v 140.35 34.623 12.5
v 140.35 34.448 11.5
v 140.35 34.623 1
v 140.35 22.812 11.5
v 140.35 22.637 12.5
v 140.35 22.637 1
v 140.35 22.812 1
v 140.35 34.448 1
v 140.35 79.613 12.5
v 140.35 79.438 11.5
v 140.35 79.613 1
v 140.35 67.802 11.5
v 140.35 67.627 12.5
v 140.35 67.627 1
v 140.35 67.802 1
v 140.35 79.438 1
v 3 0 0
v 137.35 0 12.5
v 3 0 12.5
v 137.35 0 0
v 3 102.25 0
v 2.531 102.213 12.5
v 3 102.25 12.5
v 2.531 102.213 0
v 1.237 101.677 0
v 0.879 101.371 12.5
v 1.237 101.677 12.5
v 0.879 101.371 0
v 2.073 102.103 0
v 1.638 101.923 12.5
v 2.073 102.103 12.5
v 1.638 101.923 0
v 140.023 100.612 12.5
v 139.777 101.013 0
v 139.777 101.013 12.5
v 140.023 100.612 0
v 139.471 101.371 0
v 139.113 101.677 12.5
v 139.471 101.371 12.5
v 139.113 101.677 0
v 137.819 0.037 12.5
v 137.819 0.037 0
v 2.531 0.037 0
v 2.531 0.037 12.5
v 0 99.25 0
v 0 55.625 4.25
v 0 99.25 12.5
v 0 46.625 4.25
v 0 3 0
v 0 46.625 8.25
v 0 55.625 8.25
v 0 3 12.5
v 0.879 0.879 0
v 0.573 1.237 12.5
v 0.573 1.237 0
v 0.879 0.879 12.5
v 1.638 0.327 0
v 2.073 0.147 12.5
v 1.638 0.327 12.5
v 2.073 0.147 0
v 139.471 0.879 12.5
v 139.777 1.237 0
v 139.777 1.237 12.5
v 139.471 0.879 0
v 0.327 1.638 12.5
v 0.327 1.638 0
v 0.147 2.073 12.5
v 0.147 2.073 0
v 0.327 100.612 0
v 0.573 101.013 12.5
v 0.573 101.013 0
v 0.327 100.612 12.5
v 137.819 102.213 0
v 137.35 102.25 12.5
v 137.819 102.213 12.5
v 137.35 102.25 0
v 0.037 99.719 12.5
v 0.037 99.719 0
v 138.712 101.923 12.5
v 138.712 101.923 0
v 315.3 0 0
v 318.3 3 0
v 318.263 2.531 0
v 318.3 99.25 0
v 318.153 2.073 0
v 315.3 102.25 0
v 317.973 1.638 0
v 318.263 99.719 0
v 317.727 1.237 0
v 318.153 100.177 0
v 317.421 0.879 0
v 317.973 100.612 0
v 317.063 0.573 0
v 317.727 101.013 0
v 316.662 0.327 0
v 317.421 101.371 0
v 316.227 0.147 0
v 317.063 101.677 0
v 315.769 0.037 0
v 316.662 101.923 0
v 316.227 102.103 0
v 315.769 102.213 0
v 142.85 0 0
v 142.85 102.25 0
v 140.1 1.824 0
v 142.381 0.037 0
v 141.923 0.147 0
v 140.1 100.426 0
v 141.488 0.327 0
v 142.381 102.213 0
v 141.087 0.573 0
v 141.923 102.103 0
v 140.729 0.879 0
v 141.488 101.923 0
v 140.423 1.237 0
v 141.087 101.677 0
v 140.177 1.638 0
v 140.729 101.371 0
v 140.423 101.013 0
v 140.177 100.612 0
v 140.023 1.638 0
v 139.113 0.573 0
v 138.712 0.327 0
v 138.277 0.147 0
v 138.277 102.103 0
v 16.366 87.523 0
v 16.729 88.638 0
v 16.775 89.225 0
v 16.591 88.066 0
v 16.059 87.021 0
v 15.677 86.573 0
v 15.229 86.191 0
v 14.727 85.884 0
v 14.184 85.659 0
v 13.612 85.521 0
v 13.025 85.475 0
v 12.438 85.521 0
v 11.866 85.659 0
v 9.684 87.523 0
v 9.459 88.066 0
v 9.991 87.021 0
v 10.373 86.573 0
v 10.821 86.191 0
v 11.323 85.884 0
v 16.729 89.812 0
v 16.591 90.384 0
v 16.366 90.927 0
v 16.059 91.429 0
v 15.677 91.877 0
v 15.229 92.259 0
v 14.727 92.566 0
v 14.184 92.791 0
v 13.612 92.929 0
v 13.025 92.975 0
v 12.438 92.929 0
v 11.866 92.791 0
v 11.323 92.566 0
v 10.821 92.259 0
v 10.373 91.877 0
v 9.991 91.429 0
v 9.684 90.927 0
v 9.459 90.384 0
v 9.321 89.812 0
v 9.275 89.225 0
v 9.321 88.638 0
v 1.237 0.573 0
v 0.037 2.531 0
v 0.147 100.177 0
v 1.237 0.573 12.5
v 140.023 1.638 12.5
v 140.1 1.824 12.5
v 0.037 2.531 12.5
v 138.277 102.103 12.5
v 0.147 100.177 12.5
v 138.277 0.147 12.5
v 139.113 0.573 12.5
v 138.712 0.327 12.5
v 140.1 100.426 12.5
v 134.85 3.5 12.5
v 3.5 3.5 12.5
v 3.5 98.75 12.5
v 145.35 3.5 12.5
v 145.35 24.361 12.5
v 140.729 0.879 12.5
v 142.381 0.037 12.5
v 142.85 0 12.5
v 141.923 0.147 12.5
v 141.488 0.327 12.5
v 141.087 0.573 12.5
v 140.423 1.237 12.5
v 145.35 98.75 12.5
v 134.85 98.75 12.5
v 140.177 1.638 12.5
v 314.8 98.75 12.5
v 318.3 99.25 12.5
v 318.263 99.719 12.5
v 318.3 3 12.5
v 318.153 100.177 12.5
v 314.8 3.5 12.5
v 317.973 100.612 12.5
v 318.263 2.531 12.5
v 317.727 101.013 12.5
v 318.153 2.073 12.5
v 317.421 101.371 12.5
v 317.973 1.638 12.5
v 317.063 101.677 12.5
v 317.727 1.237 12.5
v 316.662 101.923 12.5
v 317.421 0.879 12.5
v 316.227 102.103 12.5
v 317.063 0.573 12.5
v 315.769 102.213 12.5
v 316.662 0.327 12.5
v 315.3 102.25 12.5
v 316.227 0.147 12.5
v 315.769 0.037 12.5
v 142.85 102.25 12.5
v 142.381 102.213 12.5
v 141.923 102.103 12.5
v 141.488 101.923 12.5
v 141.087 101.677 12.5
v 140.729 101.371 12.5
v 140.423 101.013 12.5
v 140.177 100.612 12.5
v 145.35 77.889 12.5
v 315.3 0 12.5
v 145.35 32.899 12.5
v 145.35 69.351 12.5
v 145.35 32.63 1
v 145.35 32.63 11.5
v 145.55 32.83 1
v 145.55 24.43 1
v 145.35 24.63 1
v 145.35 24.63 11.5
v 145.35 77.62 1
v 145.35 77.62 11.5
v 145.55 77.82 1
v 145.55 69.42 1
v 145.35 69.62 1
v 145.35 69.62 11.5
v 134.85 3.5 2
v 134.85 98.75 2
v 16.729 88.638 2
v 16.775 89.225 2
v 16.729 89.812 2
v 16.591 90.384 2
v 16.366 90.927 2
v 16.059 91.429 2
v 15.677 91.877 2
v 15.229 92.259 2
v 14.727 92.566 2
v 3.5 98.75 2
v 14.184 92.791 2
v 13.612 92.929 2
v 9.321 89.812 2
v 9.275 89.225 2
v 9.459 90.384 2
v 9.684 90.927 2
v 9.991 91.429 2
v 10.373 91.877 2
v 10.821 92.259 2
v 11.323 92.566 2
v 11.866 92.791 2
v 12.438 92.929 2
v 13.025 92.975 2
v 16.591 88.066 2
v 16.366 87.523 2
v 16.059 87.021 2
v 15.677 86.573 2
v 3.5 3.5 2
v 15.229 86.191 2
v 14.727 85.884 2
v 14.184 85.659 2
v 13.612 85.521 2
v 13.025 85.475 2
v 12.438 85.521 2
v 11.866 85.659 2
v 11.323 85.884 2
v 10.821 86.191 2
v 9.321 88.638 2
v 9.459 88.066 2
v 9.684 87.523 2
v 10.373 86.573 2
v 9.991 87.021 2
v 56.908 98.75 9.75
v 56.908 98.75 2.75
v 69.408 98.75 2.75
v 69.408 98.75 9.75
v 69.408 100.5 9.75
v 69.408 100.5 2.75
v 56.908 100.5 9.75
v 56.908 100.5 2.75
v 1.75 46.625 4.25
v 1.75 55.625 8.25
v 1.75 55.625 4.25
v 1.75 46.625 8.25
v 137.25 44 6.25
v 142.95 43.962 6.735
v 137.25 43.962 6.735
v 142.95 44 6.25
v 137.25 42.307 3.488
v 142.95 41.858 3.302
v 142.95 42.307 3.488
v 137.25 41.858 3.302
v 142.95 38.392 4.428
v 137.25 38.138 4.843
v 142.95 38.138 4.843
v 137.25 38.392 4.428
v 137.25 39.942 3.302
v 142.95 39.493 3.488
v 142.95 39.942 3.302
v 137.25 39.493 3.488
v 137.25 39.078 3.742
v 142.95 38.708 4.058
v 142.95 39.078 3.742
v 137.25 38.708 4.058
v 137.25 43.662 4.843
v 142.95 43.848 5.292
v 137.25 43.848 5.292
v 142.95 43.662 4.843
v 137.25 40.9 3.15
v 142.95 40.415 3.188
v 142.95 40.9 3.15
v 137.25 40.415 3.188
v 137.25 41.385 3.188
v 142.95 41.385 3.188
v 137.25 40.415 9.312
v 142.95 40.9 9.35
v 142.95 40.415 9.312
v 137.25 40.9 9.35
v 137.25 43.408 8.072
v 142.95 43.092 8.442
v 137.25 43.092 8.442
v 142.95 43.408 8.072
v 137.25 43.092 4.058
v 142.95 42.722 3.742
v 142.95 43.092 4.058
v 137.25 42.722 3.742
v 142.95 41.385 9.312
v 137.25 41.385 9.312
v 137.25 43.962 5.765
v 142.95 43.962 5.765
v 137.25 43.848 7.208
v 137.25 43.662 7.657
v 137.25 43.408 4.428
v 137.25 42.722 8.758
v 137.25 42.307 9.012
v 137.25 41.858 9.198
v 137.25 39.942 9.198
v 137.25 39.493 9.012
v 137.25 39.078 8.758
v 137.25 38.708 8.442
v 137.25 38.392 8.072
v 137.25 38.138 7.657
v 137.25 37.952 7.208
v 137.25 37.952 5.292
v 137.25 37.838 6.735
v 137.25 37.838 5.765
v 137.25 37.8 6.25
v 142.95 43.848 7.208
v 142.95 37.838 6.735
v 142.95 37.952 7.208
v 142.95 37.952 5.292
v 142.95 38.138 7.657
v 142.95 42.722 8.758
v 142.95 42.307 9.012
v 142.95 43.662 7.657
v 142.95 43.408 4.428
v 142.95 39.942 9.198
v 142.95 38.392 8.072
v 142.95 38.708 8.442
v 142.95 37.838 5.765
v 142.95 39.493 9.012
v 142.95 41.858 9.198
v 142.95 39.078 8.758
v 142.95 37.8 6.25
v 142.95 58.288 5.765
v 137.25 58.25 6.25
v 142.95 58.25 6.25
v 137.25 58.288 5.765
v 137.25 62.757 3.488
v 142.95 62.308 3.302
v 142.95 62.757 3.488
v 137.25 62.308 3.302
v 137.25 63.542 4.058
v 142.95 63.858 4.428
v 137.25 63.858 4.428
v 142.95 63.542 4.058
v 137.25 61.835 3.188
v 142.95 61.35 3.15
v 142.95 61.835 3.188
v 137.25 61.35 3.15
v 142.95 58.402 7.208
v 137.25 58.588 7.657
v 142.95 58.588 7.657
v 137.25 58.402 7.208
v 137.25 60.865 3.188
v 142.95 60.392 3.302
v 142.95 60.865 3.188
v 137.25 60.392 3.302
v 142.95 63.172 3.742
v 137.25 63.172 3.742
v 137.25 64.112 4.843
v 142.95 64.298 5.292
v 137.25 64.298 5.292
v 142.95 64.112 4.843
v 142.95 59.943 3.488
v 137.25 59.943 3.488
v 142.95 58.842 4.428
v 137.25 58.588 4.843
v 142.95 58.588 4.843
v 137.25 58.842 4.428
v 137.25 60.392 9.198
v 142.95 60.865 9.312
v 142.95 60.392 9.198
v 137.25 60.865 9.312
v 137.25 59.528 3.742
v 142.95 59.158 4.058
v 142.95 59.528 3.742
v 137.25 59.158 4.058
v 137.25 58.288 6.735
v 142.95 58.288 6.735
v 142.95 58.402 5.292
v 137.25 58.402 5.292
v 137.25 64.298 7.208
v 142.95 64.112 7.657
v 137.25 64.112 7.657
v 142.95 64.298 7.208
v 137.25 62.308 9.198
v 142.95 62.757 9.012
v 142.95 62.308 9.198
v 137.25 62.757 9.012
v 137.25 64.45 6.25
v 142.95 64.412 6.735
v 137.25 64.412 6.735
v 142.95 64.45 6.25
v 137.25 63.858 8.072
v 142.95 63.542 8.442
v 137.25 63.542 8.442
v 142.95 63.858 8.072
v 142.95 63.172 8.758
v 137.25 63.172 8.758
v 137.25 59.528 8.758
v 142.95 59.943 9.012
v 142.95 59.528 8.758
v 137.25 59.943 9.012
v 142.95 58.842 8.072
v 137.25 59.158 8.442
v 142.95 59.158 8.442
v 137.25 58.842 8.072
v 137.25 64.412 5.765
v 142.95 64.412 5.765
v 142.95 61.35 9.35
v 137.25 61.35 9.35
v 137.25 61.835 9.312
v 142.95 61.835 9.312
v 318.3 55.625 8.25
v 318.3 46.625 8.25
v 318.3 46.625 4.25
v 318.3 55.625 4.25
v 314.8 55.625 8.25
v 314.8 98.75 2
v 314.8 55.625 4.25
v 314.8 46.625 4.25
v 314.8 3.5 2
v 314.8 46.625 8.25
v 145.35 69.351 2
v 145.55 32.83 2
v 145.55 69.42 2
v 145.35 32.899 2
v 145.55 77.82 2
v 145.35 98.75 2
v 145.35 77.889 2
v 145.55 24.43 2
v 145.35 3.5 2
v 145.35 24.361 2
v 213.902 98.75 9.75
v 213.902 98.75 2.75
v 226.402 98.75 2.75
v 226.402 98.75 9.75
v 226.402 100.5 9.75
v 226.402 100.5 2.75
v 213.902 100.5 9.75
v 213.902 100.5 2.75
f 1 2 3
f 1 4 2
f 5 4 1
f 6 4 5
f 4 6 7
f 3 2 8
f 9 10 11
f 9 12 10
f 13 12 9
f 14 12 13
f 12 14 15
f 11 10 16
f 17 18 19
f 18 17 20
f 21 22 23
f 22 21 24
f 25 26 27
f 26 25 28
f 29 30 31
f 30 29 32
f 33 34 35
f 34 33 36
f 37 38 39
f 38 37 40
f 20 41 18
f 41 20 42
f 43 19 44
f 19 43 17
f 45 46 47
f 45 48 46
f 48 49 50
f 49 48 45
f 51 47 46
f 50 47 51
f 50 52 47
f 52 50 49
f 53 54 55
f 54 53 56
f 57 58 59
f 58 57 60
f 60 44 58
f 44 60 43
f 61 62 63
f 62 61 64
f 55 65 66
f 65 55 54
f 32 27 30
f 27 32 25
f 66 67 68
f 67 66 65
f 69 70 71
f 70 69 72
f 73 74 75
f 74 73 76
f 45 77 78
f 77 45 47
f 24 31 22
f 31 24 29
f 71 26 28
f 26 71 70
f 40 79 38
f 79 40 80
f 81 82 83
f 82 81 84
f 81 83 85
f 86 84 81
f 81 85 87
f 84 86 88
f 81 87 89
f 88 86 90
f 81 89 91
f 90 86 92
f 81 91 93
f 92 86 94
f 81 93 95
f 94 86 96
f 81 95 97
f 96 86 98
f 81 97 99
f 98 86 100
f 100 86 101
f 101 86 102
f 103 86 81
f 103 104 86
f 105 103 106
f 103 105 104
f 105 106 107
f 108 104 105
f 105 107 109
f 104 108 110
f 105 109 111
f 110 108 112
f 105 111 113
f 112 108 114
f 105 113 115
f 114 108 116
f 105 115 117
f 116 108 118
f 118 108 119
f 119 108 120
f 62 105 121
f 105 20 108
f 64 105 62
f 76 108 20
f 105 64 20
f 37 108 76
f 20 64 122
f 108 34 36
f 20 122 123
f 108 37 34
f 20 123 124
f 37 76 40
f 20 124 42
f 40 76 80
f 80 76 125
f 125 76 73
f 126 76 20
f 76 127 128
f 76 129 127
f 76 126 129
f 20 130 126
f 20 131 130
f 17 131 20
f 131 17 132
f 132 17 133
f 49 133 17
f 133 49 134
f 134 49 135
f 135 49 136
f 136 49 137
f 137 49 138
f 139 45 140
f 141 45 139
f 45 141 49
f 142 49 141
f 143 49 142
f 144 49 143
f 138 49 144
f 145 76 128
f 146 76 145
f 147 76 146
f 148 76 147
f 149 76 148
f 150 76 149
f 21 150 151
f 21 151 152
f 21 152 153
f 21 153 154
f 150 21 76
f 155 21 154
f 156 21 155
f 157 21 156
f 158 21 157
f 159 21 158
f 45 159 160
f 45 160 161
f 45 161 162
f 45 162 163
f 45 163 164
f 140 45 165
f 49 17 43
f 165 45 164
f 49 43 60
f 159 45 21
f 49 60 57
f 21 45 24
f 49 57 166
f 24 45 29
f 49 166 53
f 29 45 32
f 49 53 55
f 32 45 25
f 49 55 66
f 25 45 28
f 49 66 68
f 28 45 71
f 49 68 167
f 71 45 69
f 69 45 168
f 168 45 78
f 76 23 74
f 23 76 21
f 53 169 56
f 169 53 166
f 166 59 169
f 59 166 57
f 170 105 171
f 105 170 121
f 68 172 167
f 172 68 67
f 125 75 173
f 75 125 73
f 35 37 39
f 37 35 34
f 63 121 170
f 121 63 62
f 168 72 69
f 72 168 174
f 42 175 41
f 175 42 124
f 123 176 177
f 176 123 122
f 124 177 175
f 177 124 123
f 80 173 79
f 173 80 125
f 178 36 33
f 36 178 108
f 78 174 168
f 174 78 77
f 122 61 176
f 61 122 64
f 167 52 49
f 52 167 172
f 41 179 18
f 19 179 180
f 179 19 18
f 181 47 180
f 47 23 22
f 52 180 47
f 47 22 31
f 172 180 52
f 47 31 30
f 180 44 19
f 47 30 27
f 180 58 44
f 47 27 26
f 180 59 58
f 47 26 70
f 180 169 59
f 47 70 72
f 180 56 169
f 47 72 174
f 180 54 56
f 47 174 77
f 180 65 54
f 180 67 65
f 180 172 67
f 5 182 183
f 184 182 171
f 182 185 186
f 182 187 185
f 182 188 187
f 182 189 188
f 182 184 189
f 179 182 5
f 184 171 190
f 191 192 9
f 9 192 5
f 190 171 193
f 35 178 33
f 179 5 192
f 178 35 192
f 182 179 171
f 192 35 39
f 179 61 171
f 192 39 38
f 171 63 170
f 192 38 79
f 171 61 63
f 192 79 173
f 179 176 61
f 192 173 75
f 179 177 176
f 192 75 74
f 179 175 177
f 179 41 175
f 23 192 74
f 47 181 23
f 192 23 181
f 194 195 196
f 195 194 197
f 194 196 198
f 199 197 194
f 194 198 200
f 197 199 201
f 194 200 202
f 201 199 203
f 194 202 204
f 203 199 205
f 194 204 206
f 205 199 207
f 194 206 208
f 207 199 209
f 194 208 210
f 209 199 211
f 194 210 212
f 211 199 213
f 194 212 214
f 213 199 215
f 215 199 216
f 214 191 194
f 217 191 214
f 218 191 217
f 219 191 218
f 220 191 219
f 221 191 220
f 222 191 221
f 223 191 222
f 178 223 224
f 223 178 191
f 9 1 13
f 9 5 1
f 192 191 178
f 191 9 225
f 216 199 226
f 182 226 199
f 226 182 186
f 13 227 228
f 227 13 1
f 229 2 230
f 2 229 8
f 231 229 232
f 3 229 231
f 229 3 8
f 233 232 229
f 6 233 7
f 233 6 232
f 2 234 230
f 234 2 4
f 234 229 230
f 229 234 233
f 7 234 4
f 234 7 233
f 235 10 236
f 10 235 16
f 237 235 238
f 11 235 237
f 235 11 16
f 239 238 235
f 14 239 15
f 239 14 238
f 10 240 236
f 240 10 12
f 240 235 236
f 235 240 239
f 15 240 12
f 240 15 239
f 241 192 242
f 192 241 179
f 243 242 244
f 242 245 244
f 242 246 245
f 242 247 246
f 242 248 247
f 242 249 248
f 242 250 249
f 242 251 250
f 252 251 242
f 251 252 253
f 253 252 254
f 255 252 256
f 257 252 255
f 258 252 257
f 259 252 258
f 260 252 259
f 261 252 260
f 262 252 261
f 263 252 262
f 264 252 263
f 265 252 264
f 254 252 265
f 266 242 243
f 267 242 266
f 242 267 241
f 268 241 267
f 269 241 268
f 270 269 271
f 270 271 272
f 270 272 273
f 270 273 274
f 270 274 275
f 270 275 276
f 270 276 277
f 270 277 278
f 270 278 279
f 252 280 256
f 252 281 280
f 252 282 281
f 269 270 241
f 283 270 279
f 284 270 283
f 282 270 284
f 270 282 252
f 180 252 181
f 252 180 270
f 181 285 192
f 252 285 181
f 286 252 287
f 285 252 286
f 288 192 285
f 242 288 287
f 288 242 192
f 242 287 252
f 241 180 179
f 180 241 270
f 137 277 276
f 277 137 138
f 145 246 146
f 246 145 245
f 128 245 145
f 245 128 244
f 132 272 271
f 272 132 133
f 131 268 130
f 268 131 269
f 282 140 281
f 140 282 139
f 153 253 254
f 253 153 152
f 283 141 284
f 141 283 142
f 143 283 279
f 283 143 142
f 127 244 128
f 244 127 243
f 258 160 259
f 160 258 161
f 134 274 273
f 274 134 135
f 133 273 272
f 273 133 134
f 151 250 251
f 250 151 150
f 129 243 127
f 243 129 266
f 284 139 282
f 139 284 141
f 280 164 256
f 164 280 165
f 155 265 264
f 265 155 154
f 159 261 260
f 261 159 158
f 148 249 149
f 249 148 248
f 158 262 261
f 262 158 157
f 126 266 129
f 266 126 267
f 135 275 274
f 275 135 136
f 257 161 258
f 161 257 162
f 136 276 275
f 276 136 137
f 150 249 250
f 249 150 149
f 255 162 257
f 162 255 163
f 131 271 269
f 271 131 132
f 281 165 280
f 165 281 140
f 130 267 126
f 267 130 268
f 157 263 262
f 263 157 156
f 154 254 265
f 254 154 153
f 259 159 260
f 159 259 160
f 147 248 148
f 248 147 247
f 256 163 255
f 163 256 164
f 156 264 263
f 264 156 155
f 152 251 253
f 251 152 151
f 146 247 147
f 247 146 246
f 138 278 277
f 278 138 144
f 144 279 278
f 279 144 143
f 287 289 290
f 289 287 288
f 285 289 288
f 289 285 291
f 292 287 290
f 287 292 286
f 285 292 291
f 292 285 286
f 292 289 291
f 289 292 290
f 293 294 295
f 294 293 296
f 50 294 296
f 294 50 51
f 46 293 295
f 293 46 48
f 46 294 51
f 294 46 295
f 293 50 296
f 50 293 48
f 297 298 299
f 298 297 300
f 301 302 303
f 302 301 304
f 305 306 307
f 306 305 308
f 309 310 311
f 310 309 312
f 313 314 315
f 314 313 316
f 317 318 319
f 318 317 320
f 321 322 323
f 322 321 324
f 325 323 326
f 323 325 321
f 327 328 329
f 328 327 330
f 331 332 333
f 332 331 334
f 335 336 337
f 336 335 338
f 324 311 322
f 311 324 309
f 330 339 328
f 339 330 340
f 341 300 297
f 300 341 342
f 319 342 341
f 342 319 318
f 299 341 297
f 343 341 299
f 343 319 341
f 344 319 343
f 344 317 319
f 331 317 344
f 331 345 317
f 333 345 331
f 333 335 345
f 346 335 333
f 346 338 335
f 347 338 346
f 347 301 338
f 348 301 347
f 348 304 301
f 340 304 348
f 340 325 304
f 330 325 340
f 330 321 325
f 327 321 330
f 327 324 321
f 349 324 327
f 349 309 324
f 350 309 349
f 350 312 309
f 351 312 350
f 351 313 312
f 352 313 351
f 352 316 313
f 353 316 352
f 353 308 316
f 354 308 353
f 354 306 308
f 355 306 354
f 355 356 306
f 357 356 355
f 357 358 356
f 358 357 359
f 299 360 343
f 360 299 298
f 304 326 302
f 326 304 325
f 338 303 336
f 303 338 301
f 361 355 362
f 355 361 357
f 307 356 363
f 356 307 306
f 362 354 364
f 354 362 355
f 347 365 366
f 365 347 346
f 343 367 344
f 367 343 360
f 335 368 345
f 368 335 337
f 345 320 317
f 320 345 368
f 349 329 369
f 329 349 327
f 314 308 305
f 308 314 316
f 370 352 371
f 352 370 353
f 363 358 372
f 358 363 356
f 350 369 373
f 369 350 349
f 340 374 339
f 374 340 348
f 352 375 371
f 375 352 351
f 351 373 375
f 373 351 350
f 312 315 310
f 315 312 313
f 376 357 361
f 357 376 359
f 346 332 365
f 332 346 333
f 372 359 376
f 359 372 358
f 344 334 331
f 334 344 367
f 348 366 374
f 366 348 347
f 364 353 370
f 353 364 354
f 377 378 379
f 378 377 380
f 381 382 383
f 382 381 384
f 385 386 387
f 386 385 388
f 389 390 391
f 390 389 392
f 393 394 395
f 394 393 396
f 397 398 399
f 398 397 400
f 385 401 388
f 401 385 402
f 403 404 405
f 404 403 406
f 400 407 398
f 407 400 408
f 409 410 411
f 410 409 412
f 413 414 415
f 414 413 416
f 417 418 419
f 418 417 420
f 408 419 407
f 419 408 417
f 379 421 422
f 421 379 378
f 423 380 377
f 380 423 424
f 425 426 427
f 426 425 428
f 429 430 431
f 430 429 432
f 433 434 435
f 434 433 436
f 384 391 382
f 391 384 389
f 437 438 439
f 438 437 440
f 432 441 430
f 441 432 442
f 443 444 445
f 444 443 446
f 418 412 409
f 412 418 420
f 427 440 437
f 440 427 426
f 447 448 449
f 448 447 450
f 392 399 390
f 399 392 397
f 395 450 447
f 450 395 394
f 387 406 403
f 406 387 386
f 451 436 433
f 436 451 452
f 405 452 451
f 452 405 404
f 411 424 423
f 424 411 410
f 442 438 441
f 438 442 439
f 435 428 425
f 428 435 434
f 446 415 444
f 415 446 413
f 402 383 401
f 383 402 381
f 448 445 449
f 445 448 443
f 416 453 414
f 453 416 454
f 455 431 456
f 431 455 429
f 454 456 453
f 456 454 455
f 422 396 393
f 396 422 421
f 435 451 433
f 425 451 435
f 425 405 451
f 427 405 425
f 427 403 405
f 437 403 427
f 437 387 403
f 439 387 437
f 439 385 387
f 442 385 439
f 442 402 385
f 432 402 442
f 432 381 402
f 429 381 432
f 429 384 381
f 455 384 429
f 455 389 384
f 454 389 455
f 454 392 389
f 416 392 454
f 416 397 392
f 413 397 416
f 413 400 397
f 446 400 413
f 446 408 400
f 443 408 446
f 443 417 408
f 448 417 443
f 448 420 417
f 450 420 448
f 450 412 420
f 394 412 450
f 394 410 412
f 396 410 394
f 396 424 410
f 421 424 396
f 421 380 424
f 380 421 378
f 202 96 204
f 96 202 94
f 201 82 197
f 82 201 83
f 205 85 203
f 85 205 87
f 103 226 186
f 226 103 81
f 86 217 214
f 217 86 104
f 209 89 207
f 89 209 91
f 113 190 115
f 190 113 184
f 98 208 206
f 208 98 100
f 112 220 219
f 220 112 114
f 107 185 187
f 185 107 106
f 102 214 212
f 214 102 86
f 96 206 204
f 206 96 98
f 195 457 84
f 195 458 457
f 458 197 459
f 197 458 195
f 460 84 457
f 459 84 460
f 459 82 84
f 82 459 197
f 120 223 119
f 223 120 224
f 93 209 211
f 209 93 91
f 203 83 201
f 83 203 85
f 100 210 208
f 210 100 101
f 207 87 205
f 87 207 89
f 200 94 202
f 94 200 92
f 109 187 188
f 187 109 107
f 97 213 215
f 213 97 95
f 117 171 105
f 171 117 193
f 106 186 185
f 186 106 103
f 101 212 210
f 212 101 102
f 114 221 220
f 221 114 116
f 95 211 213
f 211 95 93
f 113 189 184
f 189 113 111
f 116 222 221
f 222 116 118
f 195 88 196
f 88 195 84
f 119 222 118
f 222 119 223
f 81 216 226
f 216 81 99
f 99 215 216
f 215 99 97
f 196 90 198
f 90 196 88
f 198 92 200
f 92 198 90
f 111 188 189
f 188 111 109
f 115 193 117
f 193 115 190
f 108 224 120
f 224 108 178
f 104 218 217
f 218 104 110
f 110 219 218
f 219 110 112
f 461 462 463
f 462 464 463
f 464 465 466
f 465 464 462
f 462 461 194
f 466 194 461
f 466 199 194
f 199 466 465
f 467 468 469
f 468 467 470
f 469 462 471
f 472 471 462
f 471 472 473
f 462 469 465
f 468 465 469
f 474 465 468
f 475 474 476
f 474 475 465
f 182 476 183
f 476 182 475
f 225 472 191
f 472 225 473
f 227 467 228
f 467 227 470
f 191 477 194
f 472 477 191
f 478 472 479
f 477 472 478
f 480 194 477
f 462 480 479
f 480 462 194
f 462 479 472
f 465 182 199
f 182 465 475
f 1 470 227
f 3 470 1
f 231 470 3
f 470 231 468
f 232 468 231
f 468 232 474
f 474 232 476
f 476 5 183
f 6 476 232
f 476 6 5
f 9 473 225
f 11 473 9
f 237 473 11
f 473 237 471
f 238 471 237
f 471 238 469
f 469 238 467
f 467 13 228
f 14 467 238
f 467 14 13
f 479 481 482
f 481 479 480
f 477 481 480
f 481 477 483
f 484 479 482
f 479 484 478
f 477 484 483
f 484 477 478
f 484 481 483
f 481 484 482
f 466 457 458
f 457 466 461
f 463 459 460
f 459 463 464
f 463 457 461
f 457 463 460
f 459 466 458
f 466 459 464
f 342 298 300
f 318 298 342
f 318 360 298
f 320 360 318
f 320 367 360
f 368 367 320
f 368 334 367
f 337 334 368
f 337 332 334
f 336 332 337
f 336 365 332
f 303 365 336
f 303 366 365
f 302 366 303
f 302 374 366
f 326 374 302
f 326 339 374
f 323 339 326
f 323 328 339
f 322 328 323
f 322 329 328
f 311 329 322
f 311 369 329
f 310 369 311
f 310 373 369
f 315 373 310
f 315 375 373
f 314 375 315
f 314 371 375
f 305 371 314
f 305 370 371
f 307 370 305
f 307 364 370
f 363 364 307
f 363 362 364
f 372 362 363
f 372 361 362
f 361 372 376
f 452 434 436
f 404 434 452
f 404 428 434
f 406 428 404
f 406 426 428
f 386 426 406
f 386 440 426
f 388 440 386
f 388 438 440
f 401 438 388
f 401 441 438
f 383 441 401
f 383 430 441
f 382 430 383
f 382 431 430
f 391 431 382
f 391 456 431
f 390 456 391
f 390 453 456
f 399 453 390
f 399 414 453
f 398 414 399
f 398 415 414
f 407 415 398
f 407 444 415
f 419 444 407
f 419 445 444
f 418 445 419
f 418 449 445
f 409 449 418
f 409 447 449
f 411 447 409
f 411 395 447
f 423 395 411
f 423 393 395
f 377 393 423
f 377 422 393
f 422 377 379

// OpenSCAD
// file: interlock_params.scad
/*
 * Interlock Ergo - Shared Parametric Definitions
 * Supports both Kailh Choc v1 (crkbd/corne style) and Cherry MX standards.
 */

// Global OpenSCAD rendering resolution
$fn = 40;

// Interlocking mechanical tolerances
interlock_tol = 0.20;     // 0.2mm sliding joint clearance
magnet_d = 6.2;           // Pocket for 6mm disc magnet
magnet_h = 3.2;           // Pocket depth for 3mm magnet
fillet_r = 3.0;           // Outer chassis corner radius
wall_thickness = 3.5;     // Exterior perimeter wall

// Switch Standards
// Choc v1 (Corne/crkbd standard): 18.0mm X pitch, 17.0mm Y pitch, 1.2mm plate thickness
choc_pitch_x = 18.0;
choc_pitch_y = 17.0;
choc_switch_cutout = 13.8;
choc_plate_thickness = 1.2;
choc_case_depth = 9.5;    // Low profile depth

// MX Standard: 19.05mm X pitch, 19.05mm Y pitch, 1.5mm plate thickness
mx_pitch_x = 19.05;
mx_pitch_y = 19.05;
mx_switch_cutout = 14.0;
mx_plate_thickness = 1.5;
mx_case_depth = 12.5;     // Standard MX depth

// Common utility: Rounded box
module rounded_box(w, l, h, r) {
    hull() {
        translate([r, r, 0]) cylinder(r = r, h = h);
        translate([w - r, r, 0]) cylinder(r = r, h = h);
        translate([w - r, l - r, 0]) cylinder(r = r, h = h);
        translate([r, l - r, 0]) cylinder(r = r, h = h);
    }
}

// Interlocking male dovetail tab
module dovetail_male(depth) {
    linear_extrude(height = depth - 2) {
        polygon(points = [
            [0, -6],
            [5.5, -4],
            [5.5, 4],
            [0, 6]
        ]);
    }
}

// Interlocking female dovetail socket
module dovetail_female(depth) {
    linear_extrude(height = depth) {
        polygon(points = [
            [-0.1, -6 - interlock_tol],
            [5.5 + interlock_tol, -4 - interlock_tol],
            [5.5 + interlock_tol, 4 + interlock_tol],
            [-0.1, 6 + interlock_tol]
        ]);
    }
}

// Magnet pocket
module magnet_cavity() {
    cylinder(d = magnet_d, h = magnet_h, center = true);
}
// main file
/*
 * Interlock Ergo - Cherry MX Standard Profile Variant
 * Spacing: 19.05mm X x 19.05mm Y
 * Plate thickness: 1.5mm
 * Interlocking seam follows 5-T-G-B (Left) and 6-Y-H-N (Right)
 */

include <interlock_params.scad>

cols_left = 7;
cols_right = 9;
rows = 5;

// Overall dimensions
left_w = cols_left * mx_pitch_x + wall_thickness * 2;
left_l = rows * mx_pitch_y + wall_thickness * 2;

right_w = cols_right * mx_pitch_x + wall_thickness * 2;
right_l = rows * mx_pitch_y + wall_thickness * 2;

module mx_left_case() {
    difference() {
        union() {
            rounded_box(left_w, left_l, mx_case_depth, fillet_r);
            // Interlocking male tabs
            translate([left_w - 0.5, left_l * 0.28, 1]) dovetail_male(mx_case_depth);
            translate([left_w - 0.5, left_l * 0.72, 1]) dovetail_male(mx_case_depth);
        }

        // Interior cavity
        translate([wall_thickness, wall_thickness, 2.0])
            cube([left_w - wall_thickness * 2 - 2, left_l - wall_thickness * 2, mx_case_depth]);

        // Rotary Encoder Cutout
        translate([wall_thickness + mx_pitch_x * 0.5, left_l - wall_thickness - mx_pitch_y * 0.5, 0])
            cylinder(d = 7.5, h = mx_case_depth * 2, center = true);

        // USB-C controller port cutout
        translate([left_w * 0.45, left_l - wall_thickness - 1, mx_case_depth * 0.5])
            cube([12.5, wall_thickness + 2, 7.0], center = true);

        // Power switch cutout (Left edge)
        translate([-1, left_l * 0.5, mx_case_depth * 0.5])
            cube([wall_thickness + 2, 9.0, 4.0], center = true);

        // 6x3mm Magnet cavities on the interlocking face
        translate([left_w - 1.5, left_l * 0.4, mx_case_depth * 0.5])
            rotate([0, 90, 0]) magnet_cavity();
        translate([left_w - 1.5, left_l * 0.6, mx_case_depth * 0.5])
            rotate([0, 90, 0]) magnet_cavity();
    }
}

module mx_right_case() {
    difference() {
        rounded_box(right_w, right_l, mx_case_depth, fillet_r);

        // Interior cavity
        translate([wall_thickness + 2, wall_thickness, 2.0])
            cube([right_w - wall_thickness * 2 - 2, right_l - wall_thickness * 2, mx_case_depth]);

        // Interlocking female sockets
        translate([0, right_l * 0.28, 1]) dovetail_female(mx_case_depth);
        translate([0, right_l * 0.72, 1]) dovetail_female(mx_case_depth);

        // USB-C controller port cutout
        translate([right_w * 0.45, right_l - wall_thickness - 1, mx_case_depth * 0.5])
            cube([12.5, wall_thickness + 2, 7.0], center = true);

        // Power switch cutout (Right edge)
        translate([right_w - wall_thickness + 1, right_l * 0.5, mx_case_depth * 0.5])
            cube([wall_thickness + 2, 9.0, 4.0], center = true);

        // 6x3mm Magnet cavities on the interlocking face
        translate([1.5, right_l * 0.4, mx_case_depth * 0.5])
            rotate([0, 90, 0]) magnet_cavity();
        translate([1.5, right_l * 0.6, mx_case_depth * 0.5])
            rotate([0, 90, 0]) magnet_cavity();
    }
}

mode = "assembly";

if (mode == "left") {
    mx_left_case();
} else if (mode == "right") {
    mx_right_case();
} else {
    mx_left_case();
    translate([left_w - 0.5, 0, 0]) mx_right_case();
}
